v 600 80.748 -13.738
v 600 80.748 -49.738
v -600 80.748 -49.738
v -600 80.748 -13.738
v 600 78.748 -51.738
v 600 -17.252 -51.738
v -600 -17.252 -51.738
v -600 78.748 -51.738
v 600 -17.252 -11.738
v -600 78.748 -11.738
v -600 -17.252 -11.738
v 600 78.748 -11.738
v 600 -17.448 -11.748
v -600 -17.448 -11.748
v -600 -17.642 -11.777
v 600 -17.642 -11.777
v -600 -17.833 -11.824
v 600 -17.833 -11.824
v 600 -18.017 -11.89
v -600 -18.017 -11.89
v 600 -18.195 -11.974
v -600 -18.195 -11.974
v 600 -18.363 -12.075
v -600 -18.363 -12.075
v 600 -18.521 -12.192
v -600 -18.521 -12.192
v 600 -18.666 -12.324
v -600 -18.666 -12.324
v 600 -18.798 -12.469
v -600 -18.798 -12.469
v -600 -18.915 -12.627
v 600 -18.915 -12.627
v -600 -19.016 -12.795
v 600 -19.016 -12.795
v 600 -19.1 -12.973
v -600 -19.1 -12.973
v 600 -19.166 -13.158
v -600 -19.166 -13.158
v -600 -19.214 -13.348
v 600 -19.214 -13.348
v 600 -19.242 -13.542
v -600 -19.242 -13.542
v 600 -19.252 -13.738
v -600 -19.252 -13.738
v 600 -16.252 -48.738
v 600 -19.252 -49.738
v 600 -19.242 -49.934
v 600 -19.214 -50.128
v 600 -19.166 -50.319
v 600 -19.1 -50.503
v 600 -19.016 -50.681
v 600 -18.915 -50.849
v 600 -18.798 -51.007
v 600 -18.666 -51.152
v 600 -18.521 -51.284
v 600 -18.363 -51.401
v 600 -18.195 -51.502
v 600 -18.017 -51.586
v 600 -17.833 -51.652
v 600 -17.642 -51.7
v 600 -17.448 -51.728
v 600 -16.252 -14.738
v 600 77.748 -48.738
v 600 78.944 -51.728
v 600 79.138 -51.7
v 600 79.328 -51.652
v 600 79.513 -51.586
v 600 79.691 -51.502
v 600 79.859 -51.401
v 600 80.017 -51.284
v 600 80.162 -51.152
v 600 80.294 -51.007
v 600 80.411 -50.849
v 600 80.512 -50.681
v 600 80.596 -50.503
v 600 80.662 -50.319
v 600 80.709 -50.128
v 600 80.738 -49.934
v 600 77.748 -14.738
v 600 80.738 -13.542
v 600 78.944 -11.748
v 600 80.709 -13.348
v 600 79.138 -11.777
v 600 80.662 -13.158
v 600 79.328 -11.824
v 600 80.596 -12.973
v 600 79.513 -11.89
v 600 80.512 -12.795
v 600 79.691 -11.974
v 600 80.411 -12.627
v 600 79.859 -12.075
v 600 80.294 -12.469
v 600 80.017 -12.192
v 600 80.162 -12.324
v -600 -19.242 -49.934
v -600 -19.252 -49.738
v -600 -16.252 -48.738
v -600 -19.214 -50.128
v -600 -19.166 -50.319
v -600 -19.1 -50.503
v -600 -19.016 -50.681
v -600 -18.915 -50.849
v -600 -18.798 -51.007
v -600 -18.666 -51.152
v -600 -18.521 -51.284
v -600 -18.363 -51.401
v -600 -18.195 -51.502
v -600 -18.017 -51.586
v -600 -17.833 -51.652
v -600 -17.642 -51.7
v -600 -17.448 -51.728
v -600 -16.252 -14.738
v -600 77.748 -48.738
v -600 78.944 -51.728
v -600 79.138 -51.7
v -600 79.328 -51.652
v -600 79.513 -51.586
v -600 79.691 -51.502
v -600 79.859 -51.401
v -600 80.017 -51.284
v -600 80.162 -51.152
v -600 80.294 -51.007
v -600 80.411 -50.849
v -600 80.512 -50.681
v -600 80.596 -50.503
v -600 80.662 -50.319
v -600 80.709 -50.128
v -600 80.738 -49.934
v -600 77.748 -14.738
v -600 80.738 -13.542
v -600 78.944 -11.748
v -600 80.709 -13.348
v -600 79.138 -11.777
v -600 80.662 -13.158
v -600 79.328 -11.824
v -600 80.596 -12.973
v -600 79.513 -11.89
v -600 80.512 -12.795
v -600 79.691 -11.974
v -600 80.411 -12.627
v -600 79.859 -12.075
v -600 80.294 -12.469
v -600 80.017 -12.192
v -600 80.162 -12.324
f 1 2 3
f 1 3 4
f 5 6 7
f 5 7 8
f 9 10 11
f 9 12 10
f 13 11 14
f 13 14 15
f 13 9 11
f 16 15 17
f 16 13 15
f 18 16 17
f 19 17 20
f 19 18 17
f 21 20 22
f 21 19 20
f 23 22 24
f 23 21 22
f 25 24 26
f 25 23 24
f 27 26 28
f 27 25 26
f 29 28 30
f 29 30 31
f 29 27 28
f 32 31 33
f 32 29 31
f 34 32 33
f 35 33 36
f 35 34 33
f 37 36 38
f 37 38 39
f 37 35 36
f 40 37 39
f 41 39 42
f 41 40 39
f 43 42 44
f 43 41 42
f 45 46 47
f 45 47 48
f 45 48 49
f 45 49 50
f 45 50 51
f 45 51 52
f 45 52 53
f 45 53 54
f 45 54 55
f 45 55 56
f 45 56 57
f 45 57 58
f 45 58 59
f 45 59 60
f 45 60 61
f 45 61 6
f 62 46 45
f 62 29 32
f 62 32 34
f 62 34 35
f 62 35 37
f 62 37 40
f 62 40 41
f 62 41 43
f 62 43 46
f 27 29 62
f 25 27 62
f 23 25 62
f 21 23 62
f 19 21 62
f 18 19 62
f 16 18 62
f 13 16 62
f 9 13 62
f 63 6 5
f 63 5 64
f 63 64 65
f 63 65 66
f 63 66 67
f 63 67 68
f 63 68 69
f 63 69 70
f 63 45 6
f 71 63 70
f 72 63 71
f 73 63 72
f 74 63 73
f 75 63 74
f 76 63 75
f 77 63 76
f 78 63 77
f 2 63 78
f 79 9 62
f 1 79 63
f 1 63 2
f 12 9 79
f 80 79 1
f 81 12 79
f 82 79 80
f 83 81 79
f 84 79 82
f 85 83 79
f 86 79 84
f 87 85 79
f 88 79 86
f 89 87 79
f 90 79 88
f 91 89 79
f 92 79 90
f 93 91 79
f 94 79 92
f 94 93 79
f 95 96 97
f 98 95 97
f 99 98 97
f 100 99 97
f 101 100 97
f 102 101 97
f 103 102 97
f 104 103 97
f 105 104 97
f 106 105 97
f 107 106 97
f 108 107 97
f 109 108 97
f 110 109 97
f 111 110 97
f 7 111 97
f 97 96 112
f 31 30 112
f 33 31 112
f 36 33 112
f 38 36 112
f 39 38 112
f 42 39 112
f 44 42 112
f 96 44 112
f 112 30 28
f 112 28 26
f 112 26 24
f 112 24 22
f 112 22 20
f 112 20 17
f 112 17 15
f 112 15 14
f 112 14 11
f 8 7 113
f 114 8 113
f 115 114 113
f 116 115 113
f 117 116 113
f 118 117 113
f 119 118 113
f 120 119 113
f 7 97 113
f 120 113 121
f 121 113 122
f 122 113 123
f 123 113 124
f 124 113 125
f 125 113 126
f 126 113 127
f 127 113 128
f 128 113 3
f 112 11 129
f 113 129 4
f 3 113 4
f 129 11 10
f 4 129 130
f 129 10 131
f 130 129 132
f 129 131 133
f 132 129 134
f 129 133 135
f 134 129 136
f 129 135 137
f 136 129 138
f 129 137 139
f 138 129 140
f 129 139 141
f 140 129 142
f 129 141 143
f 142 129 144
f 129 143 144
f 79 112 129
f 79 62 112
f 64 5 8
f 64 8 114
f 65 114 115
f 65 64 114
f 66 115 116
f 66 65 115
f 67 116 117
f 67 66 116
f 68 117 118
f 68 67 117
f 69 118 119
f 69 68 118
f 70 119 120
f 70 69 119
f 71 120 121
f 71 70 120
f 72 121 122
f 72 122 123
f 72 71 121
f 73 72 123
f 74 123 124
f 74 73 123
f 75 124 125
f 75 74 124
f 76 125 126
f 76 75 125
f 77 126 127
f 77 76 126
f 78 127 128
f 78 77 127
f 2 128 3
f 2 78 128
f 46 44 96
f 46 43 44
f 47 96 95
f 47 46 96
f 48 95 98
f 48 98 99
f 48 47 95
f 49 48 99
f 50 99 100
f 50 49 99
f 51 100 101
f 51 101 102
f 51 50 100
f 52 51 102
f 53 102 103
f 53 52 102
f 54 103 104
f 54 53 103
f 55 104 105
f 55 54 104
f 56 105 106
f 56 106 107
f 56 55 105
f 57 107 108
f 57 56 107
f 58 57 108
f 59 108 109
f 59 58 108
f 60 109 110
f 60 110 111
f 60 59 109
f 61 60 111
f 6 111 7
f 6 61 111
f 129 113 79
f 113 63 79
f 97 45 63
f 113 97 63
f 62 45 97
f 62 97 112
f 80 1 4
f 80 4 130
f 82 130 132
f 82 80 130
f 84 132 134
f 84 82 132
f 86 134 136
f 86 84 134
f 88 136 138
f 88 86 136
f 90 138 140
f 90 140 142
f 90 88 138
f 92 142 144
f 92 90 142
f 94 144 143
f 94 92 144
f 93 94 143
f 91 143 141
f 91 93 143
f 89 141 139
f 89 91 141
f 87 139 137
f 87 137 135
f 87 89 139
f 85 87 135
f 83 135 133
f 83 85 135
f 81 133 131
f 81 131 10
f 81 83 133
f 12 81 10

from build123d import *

# Parameters (mm, degrees)
F1_W     = 94
F1_H     = 34
F2_DEPTH = 600


with BuildPart() as f2:
    # F1 (on Right) → F2 (new body, symmetric)
    with BuildSketch(Plane.YZ):
        with BuildLine():
            ThreePointArc((-19.2521204937, -49.7380952381), (-18.6663340561, -51.1523088005), (-17.2521204937, -51.7380952381))
            Line((-17.2521204937, -51.7380952381), (78.7478795063, -51.7380952381))
            ThreePointArc((78.7478795063, -51.7380952381), (80.1620930687, -51.1523088005), (80.7478795063, -49.7380952381))
            Line((80.7478795063, -49.7380952381), (80.7478795063, -13.7380952381))
            ThreePointArc((80.7478795063, -13.7380952381), (80.1620930687, -12.3238816757), (78.7478795063, -11.7380952381))
            Line((78.7478795063, -11.7380952381), (-17.2521204937, -11.7380952381))
            ThreePointArc((-17.2521204937, -11.7380952381), (-18.6663340561, -12.3238816757), (-19.2521204937, -13.7380952381))
            Line((-19.2521204937, -13.7380952381), (-19.2521204937, -49.7380952381))
        make_face()
        with Locations((30.7478795063, -31.7380952381)):
            Rectangle(F1_W, F1_H, mode=Mode.SUBTRACT)
    extrude(amount=F2_DEPTH, both=True)


with BuildPart() as f3_1:
    # F3: copy of F2
    add(f2.part)


solid = f2.part
